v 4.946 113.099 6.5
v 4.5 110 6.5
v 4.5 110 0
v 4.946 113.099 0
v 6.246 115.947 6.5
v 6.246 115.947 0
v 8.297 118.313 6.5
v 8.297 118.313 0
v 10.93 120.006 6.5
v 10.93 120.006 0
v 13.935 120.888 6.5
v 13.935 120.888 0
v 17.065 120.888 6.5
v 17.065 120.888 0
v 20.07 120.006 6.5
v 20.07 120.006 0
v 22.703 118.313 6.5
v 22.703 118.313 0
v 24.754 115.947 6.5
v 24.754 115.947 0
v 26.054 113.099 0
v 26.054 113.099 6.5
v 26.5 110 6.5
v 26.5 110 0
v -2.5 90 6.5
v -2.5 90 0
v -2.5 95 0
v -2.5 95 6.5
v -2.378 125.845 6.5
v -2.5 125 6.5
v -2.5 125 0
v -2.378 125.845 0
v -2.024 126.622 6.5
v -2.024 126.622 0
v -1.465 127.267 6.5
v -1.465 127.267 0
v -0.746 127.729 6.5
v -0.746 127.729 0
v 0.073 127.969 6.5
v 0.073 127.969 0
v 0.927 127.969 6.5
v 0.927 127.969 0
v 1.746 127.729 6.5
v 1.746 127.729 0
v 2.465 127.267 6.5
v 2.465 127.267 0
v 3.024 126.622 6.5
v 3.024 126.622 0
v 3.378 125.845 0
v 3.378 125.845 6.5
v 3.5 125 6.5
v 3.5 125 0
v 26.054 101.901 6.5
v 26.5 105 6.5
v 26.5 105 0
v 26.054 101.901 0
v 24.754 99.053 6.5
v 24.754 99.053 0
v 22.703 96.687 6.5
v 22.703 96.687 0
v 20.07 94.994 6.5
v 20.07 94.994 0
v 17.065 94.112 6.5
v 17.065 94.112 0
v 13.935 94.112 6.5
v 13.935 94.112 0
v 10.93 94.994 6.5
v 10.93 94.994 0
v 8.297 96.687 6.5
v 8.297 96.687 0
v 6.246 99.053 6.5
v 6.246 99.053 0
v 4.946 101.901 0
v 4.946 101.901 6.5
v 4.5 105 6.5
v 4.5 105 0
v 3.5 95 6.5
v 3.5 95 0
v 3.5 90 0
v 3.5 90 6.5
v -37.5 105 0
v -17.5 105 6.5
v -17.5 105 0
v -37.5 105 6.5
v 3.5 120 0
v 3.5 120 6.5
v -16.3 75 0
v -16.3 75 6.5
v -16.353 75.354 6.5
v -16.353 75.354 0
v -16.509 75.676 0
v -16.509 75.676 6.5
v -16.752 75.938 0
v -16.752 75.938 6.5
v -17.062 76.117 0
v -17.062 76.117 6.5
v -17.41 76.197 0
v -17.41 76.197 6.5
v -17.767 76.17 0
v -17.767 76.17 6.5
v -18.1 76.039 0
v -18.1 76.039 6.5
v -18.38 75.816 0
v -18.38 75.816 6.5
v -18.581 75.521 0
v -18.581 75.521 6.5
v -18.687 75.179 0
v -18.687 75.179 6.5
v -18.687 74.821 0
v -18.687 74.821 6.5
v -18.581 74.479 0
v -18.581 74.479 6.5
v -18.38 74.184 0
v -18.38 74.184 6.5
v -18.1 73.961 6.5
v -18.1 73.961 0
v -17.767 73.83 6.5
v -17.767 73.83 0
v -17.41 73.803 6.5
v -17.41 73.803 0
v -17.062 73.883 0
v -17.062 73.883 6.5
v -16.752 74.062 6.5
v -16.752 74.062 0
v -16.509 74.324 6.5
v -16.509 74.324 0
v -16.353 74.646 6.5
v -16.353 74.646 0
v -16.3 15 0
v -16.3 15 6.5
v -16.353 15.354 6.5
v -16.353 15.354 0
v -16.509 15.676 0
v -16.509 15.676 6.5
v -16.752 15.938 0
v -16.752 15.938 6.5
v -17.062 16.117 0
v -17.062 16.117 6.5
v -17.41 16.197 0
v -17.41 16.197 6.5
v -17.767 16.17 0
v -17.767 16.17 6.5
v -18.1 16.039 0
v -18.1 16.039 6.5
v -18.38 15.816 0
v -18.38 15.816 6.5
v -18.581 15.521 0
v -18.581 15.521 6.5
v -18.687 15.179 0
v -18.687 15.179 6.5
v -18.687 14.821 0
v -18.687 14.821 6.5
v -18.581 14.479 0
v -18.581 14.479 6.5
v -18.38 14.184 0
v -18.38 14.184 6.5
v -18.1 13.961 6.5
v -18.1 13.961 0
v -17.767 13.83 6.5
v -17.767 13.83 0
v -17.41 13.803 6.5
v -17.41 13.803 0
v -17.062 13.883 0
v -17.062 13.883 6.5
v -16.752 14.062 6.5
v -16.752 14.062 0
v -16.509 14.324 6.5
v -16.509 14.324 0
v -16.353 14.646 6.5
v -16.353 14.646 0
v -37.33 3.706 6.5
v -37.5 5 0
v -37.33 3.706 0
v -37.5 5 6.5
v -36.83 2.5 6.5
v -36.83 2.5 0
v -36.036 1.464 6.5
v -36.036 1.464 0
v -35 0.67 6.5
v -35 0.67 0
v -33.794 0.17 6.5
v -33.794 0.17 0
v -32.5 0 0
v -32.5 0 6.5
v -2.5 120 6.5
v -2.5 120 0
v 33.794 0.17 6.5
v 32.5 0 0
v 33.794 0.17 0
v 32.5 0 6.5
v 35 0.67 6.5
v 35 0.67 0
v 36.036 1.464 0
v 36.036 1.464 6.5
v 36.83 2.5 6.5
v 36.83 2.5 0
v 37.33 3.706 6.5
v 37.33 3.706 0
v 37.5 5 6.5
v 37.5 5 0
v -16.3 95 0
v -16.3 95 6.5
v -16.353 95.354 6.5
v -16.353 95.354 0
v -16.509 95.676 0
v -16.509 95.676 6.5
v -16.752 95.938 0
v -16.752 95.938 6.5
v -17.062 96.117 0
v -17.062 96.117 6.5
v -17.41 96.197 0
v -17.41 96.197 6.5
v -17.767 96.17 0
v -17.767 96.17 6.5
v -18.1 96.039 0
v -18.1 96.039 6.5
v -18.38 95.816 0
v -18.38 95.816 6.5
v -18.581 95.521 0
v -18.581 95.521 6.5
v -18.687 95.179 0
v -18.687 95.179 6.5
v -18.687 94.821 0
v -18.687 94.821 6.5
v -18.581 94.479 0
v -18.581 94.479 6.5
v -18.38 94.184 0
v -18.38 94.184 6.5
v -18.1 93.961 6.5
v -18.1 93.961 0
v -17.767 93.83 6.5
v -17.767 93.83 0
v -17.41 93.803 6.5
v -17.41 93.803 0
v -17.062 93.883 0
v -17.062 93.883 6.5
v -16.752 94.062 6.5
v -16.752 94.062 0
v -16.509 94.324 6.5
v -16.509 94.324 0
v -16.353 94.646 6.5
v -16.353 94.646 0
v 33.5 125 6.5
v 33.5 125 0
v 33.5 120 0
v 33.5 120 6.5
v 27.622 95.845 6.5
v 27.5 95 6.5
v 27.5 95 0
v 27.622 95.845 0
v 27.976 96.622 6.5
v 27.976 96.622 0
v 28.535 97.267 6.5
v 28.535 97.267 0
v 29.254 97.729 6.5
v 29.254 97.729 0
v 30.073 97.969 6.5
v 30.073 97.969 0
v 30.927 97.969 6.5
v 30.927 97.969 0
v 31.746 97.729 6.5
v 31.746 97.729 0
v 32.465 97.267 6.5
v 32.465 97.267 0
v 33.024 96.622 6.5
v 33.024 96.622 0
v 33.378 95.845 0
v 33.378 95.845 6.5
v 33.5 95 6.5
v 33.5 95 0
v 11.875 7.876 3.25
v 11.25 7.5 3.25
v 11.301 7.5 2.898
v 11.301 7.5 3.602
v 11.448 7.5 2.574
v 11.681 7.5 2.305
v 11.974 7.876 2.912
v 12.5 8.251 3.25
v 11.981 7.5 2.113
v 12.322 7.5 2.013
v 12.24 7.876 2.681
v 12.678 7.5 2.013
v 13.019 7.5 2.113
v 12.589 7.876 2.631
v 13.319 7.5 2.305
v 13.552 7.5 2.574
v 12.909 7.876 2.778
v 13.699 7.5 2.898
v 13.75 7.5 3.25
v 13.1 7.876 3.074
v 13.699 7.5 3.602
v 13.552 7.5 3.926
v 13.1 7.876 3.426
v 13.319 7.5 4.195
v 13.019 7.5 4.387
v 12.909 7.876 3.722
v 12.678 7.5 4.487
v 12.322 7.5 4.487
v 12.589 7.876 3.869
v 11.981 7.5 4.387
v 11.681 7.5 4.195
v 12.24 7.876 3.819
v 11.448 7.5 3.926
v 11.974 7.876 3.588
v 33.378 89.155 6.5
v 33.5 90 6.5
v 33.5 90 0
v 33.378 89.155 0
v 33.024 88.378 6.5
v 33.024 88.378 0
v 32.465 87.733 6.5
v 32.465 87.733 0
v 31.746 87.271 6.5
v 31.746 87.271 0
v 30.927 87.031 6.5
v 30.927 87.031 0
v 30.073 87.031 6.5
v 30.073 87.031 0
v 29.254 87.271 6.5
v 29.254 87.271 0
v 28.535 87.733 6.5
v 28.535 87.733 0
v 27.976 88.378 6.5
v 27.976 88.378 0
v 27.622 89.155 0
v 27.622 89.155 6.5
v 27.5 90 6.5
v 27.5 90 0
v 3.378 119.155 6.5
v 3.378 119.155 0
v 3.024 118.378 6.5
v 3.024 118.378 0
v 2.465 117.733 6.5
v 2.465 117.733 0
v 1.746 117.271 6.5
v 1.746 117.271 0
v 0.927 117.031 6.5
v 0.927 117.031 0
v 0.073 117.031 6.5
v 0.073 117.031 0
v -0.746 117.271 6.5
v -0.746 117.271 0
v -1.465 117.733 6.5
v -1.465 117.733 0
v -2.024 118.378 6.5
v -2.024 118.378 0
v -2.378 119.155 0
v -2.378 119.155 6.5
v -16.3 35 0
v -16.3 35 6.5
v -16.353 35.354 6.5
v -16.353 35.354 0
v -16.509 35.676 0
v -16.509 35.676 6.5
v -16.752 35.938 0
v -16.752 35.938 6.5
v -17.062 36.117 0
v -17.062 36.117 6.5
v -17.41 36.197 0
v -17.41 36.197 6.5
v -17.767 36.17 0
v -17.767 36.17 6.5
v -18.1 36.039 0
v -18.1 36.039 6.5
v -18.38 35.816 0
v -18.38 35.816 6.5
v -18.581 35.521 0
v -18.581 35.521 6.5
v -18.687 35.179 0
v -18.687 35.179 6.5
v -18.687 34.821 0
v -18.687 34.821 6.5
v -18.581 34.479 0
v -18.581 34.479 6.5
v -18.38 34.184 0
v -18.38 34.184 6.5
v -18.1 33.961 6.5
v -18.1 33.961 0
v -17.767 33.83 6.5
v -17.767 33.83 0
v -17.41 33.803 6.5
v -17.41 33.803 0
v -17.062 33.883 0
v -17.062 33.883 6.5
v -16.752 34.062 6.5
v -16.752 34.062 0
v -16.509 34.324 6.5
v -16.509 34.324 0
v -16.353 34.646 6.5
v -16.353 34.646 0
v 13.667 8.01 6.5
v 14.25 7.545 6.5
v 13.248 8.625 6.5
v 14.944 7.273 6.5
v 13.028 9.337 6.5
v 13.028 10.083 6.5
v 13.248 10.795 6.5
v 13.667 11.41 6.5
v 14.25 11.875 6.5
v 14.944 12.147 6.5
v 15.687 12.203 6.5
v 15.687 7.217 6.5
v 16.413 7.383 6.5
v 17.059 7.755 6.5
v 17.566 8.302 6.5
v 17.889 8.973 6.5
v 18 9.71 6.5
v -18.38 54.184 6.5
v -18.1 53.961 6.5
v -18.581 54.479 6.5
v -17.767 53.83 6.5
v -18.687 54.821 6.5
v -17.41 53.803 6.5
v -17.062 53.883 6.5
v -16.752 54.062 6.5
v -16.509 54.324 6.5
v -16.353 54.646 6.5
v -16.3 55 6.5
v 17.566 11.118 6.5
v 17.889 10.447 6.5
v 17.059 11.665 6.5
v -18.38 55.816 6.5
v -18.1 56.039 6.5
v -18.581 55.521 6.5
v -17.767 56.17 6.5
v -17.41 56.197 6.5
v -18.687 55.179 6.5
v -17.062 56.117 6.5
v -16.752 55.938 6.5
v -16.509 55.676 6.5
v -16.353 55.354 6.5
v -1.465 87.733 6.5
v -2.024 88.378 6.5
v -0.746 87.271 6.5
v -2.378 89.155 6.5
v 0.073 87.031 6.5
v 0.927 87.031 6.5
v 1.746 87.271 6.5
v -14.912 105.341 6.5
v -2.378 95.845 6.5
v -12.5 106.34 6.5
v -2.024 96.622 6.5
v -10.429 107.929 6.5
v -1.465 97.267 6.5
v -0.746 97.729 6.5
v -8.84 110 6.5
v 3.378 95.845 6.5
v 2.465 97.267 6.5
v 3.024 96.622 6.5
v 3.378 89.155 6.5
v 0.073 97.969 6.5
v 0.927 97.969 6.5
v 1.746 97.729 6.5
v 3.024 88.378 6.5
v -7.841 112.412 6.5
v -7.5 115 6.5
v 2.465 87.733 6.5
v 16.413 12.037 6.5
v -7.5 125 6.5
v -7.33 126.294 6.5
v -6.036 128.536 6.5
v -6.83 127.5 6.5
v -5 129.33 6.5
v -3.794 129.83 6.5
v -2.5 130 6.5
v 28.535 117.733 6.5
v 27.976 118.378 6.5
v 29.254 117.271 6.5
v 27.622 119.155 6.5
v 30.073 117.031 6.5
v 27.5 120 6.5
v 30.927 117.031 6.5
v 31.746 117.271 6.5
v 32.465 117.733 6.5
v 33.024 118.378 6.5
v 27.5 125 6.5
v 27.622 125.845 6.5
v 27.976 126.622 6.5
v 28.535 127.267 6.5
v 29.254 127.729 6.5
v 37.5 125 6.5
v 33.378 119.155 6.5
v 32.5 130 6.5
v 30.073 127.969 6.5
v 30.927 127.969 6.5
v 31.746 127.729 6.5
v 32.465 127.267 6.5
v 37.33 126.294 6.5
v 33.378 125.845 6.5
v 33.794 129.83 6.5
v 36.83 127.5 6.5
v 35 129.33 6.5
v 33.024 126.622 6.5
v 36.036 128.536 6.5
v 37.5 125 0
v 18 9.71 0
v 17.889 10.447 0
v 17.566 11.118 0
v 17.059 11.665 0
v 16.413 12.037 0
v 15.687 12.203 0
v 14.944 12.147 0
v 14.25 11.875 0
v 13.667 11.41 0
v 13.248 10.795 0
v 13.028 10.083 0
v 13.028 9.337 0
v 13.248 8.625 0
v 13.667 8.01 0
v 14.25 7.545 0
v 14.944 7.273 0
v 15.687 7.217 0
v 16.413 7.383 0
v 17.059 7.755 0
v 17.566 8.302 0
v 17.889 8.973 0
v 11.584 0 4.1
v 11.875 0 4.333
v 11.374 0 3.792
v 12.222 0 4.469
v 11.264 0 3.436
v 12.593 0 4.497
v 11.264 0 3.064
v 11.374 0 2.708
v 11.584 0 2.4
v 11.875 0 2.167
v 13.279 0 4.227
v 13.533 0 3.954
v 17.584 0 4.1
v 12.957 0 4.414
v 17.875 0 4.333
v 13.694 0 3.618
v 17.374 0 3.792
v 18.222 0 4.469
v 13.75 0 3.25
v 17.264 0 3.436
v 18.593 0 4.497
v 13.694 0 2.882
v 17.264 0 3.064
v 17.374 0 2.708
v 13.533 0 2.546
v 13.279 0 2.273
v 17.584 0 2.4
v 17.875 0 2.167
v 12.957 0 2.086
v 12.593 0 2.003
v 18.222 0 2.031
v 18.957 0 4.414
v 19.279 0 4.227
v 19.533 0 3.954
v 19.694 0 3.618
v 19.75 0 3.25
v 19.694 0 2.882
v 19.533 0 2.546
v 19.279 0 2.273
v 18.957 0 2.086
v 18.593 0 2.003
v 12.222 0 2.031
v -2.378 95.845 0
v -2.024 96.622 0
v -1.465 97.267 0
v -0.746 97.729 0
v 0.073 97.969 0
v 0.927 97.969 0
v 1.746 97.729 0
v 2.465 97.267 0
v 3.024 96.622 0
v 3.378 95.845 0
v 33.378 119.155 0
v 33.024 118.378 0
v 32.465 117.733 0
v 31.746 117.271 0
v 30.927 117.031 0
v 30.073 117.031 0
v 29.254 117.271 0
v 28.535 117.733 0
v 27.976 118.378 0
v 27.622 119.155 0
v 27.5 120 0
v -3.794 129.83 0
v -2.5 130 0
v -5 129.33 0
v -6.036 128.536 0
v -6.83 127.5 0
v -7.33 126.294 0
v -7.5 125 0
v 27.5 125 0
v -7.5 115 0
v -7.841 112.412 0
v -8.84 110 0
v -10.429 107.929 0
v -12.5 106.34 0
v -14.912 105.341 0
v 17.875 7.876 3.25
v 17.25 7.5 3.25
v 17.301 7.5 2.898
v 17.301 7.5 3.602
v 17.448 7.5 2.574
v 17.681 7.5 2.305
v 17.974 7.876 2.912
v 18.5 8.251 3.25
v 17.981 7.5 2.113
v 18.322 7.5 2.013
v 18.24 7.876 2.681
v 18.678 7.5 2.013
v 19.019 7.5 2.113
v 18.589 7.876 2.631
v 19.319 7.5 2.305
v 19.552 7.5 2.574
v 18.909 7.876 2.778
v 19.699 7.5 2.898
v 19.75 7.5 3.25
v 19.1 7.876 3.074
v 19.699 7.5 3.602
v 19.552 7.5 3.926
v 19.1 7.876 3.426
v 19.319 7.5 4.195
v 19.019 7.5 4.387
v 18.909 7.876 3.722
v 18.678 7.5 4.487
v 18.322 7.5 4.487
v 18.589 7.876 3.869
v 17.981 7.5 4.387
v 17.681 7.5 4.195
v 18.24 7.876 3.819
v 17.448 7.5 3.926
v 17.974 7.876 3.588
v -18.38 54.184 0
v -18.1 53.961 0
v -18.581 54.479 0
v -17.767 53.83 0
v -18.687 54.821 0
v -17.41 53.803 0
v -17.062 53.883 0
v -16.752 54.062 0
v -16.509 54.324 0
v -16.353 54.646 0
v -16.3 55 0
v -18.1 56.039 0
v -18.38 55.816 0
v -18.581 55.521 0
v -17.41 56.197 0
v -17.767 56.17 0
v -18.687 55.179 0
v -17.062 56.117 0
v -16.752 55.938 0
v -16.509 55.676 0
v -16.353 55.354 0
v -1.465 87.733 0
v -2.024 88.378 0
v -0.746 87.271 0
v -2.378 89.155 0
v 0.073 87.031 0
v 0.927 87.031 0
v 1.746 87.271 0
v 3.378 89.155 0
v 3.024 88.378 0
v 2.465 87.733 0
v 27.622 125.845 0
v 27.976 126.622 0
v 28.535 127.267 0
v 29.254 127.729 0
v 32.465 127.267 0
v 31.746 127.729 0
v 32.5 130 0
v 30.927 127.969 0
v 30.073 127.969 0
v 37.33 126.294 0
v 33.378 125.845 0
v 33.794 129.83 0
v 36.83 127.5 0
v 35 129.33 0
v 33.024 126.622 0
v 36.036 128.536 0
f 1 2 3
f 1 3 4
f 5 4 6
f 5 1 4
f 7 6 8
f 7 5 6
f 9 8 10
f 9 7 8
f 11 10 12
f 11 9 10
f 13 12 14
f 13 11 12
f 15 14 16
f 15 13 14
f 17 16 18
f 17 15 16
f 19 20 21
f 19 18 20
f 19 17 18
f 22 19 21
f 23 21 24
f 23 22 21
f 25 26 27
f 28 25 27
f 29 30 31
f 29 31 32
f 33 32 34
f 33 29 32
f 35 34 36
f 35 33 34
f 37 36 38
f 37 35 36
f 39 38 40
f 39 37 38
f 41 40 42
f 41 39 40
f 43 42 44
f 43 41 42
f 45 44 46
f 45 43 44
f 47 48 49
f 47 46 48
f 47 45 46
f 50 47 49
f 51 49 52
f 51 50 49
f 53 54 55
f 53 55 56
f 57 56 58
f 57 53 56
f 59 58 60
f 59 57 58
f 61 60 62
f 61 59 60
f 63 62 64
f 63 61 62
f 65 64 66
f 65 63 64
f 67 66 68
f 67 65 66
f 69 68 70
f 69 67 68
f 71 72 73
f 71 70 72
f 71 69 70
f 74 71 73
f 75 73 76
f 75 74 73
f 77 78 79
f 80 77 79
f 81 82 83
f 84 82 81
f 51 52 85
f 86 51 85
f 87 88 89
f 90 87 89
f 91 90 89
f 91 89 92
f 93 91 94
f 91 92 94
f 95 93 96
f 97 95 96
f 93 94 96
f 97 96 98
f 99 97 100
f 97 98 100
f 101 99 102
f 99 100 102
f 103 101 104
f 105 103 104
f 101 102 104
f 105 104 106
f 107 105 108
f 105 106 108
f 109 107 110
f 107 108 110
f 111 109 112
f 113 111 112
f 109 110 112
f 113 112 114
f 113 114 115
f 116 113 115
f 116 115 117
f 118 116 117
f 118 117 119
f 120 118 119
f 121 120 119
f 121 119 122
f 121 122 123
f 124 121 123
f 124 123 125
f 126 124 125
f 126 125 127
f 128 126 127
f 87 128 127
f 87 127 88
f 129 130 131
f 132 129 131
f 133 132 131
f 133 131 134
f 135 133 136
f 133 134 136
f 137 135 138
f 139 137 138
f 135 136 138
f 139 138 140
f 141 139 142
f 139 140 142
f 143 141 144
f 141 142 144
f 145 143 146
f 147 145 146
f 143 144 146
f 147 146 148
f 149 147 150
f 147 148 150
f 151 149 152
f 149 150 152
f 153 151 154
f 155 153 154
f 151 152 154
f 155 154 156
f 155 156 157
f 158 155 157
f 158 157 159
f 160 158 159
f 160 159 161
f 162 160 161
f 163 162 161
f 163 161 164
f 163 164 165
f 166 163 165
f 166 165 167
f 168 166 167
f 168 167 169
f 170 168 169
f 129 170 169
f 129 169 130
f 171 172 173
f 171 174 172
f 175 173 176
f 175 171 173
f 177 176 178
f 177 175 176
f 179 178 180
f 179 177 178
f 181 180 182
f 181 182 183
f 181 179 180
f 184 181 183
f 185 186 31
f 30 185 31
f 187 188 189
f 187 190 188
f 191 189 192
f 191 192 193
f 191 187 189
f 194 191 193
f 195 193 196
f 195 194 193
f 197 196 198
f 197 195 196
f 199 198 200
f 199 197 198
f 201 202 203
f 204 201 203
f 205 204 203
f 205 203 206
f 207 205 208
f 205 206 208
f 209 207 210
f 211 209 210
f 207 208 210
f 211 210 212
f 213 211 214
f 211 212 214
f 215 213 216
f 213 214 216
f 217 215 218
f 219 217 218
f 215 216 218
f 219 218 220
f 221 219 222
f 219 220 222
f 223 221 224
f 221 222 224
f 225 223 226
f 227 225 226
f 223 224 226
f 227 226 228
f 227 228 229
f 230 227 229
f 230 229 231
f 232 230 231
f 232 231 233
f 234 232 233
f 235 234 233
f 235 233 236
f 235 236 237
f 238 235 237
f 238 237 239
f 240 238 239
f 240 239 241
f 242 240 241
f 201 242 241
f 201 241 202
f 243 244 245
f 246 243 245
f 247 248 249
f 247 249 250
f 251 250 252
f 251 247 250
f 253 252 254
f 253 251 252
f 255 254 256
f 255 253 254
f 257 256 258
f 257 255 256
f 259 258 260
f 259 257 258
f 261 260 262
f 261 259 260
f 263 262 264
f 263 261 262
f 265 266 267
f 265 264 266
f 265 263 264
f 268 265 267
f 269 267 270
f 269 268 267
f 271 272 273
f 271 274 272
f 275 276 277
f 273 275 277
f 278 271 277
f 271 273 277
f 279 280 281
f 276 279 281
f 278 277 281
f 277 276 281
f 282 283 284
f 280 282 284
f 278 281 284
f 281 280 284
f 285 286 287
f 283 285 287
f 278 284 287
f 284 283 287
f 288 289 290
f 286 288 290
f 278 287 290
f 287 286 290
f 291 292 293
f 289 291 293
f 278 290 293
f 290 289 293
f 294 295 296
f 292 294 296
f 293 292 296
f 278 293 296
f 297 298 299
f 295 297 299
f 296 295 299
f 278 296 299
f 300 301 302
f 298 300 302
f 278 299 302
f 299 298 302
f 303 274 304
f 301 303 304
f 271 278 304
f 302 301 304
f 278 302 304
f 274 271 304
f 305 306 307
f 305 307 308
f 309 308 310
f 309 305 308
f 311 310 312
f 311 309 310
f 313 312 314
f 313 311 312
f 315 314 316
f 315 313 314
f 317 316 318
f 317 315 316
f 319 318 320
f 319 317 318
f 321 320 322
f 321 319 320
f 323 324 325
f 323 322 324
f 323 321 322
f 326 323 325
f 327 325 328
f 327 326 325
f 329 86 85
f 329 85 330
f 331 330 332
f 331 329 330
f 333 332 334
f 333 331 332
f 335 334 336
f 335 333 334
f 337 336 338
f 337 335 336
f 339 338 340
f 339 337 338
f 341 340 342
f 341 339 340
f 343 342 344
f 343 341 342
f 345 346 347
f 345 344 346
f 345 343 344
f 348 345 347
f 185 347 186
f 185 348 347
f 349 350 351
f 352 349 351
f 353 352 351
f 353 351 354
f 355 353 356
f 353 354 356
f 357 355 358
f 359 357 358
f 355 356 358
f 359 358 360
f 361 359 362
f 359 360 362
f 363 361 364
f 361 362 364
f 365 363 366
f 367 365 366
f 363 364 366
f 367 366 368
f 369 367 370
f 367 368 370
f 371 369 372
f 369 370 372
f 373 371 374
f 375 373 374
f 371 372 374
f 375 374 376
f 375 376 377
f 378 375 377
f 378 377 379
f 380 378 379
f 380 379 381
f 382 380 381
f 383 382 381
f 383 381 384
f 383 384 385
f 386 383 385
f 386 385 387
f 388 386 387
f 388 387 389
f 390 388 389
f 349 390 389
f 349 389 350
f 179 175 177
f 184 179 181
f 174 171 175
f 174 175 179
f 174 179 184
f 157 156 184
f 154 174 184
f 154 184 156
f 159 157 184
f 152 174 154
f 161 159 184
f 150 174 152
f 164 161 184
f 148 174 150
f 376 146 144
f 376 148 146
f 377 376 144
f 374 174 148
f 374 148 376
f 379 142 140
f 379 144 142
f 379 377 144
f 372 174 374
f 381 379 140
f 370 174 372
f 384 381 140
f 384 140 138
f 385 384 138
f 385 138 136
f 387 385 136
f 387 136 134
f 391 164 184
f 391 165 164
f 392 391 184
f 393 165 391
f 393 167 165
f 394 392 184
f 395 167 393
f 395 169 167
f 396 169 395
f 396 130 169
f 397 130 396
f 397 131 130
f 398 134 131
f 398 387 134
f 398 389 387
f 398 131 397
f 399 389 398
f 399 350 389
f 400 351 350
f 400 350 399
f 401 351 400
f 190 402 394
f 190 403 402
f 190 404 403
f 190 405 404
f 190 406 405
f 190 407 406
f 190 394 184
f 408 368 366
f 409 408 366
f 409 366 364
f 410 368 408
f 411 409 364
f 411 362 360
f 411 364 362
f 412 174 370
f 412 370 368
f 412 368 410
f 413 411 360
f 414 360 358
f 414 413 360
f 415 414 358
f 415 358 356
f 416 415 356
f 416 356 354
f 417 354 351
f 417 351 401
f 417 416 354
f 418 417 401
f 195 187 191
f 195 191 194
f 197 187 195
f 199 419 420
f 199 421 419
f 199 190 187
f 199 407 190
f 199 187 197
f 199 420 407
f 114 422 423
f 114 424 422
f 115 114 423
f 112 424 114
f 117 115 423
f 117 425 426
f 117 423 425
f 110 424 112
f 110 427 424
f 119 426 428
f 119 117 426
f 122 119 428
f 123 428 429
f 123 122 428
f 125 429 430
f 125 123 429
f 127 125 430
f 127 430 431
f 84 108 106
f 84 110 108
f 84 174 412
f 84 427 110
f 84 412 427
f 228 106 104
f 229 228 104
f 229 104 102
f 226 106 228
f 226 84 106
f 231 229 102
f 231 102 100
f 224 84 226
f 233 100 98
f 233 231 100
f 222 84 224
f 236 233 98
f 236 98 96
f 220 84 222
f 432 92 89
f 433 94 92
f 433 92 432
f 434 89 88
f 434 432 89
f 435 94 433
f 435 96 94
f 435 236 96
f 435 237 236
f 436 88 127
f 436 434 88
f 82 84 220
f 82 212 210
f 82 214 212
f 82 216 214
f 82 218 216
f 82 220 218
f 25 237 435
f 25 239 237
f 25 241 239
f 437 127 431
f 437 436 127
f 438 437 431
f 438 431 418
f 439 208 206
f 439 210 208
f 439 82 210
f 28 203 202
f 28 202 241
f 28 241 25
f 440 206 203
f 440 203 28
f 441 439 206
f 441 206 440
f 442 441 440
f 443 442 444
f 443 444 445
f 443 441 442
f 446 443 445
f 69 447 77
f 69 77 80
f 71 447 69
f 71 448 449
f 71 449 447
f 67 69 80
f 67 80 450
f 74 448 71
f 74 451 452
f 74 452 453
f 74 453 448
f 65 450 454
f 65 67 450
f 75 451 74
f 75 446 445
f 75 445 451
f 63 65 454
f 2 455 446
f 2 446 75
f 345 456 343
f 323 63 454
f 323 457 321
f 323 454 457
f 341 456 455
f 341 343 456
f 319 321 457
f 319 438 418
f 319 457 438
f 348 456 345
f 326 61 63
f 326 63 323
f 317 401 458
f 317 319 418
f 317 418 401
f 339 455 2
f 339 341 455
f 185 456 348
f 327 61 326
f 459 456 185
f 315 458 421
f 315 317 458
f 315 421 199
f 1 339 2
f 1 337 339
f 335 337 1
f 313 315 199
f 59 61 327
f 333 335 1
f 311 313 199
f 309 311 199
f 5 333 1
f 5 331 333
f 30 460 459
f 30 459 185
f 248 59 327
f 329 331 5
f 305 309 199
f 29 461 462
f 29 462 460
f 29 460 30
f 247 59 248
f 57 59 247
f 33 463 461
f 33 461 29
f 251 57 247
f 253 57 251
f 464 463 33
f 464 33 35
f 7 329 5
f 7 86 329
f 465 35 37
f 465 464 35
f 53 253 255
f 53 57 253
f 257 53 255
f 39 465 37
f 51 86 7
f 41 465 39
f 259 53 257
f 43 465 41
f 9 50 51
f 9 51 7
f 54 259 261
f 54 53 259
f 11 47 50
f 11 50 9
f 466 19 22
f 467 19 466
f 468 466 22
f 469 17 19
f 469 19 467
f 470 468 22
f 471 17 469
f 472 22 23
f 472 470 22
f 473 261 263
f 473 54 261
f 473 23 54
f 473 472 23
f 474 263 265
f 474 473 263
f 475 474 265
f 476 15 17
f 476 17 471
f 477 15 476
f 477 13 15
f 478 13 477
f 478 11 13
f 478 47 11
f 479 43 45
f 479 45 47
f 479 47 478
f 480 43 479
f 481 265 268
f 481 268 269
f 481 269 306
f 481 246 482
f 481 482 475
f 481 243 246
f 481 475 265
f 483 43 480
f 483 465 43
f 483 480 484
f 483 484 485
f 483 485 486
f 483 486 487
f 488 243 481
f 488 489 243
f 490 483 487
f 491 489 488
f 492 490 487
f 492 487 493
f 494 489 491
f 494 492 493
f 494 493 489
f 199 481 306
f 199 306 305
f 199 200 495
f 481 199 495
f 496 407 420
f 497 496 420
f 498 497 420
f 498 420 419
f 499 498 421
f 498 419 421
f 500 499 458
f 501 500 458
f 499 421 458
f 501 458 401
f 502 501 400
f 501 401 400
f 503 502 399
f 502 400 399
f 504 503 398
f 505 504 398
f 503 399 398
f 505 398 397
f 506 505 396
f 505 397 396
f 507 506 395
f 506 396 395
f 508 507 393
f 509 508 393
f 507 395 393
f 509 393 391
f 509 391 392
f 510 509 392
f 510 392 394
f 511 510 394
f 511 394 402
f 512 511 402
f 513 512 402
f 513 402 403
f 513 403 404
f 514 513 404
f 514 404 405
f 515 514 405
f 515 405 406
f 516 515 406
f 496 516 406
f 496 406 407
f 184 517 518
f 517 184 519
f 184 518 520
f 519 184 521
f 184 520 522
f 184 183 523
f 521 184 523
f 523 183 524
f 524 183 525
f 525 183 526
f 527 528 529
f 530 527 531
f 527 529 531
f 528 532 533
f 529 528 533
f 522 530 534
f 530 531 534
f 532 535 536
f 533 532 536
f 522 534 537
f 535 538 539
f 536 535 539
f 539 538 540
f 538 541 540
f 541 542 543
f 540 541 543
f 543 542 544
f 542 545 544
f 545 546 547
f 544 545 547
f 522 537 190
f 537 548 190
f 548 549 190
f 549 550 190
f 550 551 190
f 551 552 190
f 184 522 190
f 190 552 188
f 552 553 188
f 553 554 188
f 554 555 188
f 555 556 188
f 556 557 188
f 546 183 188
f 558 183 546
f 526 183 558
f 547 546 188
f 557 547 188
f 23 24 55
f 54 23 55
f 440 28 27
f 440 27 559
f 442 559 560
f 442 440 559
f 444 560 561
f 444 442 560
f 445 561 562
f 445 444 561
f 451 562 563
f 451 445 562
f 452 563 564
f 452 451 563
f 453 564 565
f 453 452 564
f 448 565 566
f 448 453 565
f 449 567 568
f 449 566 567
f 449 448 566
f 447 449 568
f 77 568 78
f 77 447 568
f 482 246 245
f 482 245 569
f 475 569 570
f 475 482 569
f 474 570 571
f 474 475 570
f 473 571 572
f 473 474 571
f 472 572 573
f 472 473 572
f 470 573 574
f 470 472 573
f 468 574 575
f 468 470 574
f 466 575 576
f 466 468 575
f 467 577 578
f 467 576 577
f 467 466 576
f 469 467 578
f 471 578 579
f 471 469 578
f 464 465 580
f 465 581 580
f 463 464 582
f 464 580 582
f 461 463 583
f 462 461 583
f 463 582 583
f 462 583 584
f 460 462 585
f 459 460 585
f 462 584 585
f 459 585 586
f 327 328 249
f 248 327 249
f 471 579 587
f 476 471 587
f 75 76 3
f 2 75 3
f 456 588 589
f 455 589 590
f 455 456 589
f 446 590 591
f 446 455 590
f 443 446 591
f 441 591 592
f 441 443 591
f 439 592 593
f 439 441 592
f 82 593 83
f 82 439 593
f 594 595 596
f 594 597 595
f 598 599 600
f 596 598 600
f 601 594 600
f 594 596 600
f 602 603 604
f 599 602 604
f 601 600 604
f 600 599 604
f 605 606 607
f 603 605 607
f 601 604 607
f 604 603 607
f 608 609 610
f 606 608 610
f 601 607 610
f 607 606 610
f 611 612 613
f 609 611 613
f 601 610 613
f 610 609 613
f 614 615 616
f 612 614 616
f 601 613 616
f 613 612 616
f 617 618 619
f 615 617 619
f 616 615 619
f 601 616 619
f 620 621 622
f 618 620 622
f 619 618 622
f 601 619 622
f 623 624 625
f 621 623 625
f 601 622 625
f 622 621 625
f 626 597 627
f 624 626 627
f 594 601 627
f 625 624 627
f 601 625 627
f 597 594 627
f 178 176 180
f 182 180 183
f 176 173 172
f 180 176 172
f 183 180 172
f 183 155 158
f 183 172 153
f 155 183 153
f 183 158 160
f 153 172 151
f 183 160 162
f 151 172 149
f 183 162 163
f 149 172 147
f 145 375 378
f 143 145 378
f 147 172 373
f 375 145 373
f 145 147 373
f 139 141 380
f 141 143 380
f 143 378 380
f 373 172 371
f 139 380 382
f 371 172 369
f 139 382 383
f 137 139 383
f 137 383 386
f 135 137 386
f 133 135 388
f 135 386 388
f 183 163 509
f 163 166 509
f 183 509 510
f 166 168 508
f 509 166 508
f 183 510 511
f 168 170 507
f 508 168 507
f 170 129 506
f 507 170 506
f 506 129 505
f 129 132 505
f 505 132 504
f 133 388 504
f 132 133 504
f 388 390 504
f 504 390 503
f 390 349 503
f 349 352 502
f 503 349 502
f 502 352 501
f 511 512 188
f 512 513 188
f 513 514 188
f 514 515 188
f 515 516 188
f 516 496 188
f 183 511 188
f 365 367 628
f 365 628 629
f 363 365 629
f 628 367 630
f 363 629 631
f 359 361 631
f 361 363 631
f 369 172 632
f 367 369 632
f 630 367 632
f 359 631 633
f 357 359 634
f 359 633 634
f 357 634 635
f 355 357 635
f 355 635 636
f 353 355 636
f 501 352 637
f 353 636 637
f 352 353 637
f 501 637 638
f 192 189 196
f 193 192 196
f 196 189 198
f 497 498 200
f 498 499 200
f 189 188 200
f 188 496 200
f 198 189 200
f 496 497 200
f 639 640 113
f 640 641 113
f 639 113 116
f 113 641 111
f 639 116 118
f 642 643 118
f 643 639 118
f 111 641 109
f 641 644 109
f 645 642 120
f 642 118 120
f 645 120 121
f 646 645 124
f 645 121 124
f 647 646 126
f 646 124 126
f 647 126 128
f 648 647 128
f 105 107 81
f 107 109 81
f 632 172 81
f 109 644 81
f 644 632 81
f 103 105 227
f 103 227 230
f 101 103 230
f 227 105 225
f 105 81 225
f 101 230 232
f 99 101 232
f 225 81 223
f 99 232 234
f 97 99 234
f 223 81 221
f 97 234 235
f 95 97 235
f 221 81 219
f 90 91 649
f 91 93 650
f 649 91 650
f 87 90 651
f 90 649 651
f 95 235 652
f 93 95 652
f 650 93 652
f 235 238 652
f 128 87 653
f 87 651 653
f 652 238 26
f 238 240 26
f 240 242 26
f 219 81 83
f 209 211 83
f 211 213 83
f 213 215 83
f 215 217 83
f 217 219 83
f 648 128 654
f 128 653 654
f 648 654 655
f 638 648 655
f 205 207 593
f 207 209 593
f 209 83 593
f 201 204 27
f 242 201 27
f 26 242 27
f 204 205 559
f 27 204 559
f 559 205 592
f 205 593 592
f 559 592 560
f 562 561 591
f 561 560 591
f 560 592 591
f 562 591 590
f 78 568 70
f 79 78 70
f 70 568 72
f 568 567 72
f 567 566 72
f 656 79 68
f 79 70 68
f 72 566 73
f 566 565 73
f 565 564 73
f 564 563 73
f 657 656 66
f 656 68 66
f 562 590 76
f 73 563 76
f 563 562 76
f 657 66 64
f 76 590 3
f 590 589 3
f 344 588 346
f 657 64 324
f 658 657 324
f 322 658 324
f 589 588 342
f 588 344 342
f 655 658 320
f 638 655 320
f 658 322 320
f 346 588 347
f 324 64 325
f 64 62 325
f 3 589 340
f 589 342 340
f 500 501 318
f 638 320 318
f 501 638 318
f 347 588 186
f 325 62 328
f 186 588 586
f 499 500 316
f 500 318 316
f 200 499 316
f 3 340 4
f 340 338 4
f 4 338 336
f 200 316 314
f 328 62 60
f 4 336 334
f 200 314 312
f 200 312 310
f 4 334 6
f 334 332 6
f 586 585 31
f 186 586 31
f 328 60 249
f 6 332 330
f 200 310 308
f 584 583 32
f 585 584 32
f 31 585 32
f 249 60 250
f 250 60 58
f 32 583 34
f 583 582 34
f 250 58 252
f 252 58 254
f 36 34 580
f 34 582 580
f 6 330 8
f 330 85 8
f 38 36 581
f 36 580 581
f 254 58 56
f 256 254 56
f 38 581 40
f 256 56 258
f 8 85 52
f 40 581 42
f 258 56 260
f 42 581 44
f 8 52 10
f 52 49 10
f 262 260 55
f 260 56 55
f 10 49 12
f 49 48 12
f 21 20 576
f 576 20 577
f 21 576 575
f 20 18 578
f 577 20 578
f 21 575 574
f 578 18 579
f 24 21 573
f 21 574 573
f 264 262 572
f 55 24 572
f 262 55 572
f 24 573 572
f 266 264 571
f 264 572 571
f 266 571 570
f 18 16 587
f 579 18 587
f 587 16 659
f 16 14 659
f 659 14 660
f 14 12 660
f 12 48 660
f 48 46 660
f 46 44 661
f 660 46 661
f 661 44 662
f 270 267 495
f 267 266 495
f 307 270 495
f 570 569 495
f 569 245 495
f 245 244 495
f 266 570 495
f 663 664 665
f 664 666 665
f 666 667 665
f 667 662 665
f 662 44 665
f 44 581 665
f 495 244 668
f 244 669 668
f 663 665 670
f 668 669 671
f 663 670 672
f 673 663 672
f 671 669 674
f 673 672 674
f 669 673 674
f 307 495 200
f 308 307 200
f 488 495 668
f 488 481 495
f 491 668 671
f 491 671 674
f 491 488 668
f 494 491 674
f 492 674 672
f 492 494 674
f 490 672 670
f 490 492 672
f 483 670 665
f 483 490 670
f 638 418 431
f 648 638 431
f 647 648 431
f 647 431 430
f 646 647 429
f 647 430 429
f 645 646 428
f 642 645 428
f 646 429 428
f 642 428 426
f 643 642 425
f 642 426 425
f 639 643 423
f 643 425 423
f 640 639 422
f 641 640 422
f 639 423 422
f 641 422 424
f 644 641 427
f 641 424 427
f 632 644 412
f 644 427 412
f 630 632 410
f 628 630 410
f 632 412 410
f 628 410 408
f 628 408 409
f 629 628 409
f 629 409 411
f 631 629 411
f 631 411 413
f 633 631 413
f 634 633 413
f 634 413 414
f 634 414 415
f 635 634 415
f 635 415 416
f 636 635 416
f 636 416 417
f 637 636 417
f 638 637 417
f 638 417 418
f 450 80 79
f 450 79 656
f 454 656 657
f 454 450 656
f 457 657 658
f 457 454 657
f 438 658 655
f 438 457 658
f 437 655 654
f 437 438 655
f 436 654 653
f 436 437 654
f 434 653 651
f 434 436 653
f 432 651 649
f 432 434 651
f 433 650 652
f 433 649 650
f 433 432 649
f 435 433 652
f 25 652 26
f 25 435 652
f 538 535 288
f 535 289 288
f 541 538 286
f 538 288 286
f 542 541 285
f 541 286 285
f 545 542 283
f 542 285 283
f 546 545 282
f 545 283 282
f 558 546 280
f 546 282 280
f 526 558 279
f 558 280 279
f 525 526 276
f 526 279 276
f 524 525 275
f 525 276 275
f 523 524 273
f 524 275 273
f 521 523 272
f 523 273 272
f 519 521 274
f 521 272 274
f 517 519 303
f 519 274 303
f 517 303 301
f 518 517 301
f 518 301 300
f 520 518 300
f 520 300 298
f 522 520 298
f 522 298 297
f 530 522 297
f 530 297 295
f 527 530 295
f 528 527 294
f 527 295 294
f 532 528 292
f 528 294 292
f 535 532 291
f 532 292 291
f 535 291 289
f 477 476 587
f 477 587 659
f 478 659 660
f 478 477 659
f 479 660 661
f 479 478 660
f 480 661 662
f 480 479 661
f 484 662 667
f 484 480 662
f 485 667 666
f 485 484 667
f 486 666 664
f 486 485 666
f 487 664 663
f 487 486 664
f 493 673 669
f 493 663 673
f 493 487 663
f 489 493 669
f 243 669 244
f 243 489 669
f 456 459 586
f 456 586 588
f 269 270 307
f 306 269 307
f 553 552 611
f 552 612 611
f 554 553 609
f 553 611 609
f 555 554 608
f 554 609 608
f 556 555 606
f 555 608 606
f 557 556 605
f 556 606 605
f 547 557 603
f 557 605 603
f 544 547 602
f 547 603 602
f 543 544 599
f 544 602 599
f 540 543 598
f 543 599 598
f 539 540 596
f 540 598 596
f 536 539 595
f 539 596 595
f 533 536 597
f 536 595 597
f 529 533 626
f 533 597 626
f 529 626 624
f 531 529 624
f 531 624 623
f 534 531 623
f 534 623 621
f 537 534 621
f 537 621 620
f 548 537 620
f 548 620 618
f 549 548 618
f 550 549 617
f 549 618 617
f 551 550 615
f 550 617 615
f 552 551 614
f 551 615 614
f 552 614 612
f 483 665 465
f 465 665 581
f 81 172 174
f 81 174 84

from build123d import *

# Parameters (mm, degrees)
SKETCH1_W                         = 37.5
SKETCH1_H                         = 130
MOUNTING_PLATE_DEPTH              = 6.5
MOTOR_MOUNT_DEPTH                 = 10
LPATTERN1_COUNT                   = 2
LPATTERN1_PITCH                   = 30
LPATTERN1_COUNT_DIR2              = 2
LPATTERN1_PITCH_DIR2              = 30
MOTOR_HOLE_DEPTH                  = 7.5
LIMIT_SWITCH_PLACEMENT_DEPTH      = 1
LIMIT_SWITCH_PLACEMENT_DEPTH_BACK = 7.5
SKETCH8_R                         = 1.2
SLIDE_HOLES_DEPTH                 = 7.5
LPATTERN2_COUNT                   = 5
LPATTERN2_PITCH                   = 20
FILLET1_R                         = 5
SKETCH16_R                        = 2.5
CUT_EXTRUDE1_DEPTH                = 7.5
M3X0_5_TAPPED_HOLE1_D             = 2.5
M3X0_5_TAPPED_HOLE1_DEPTH         = 7.5
M3X0_5_TAPPED_HOLE1_TIP           = 0.751075774


with BuildPart() as part:
    # Sketch1 → Mounting Plate (new body)
    with BuildSketch(Plane.XY):
        with Locations((-18.75, 65)):
            Rectangle(SKETCH1_W, SKETCH1_H)
        with Locations((18.75, 65)):
            Rectangle(SKETCH1_W, SKETCH1_H)
    extrude(amount=MOUNTING_PLATE_DEPTH)

    # Sketch3 → Motor Mount (cut)
    with BuildSketch(Plane.XY.offset(6.5)):
        with BuildLine():
            Line((-2.5, 120), (-2.5, 125))
            ThreePointArc((-2.5, 125), (0.5, 128), (3.5, 125))
            Line((3.5, 125), (3.5, 120))
            ThreePointArc((3.5, 120), (0.5, 117), (-2.5, 120))
        make_face()
    motor_mount = extrude(amount=-MOTOR_MOUNT_DEPTH, mode=Mode.SUBTRACT)

    # LPattern1: Motor Mount 2 × 2
    with Locations(*[(i * LPATTERN1_PITCH, -j * LPATTERN1_PITCH_DIR2, 0) for i in range(LPATTERN1_COUNT) for j in range(LPATTERN1_COUNT_DIR2) if (i, j) != (0, 0)]):
        add(motor_mount, mode=Mode.SUBTRACT)

    # Sketch7 → Motor Hole (cut, through all)
    with BuildSketch(Plane.XY.offset(6.5)):
        with BuildLine():
            Line((4.5, 105), (4.5, 110))
            ThreePointArc((4.5, 110), (15.5, 121), (26.5, 110))
            Line((26.5, 110), (26.5, 105))
            ThreePointArc((26.5, 105), (15.5, 94), (4.5, 105))
        make_face()
    extrude(amount=-MOTOR_HOLE_DEPTH, mode=Mode.SUBTRACT)

    # Sketch2 → Limit Switch Placement (cut, two sides)
    with BuildSketch(Plane.XY.offset(6.5)) as limit_switch_placement_sk:
        with BuildLine():
            Line((-7.5, 415.136329844), (-7.5, 130))
            Line((-7.5, 130), (-7.5, 115))
            ThreePointArc((-7.5, 115), (-10.428932188, 107.928932188), (-17.5, 105))
            Line((-17.5, 105), (-37.5, 105))
            Line((-37.5, 105), (-322.636329844, 105))
            Line((-322.636329844, 105), (-722.642663203, 511.455212366))
            Line((-722.642663203, 511.455212366), (-407.50633336, 821.59154221))
            Line((-407.50633336, 821.59154221), (-7.5, 415.136329844))
        make_face()
    extrude(amount=LIMIT_SWITCH_PLACEMENT_DEPTH, mode=Mode.SUBTRACT)
    extrude(limit_switch_placement_sk.sketch, amount=-LIMIT_SWITCH_PLACEMENT_DEPTH_BACK, mode=Mode.SUBTRACT)

    # Sketch8 → Slide Holes (cut, through all)
    with BuildSketch(Plane.XY.offset(6.5)):
        with Locations((-17.5, 95)):
            Circle(SKETCH8_R)
    slide_holes = extrude(amount=-SLIDE_HOLES_DEPTH, mode=Mode.SUBTRACT)

    # LPattern2: Slide Holes ×5
    with Locations(*[(0, -i * LPATTERN2_PITCH, 0) for i in range(1, LPATTERN2_COUNT)]):
        add(slide_holes, mode=Mode.SUBTRACT)

    # Fillet1
    fillet1_edges = [part.edges().sort_by_distance(p)[0] for p in [
        (37.5, 130, 3.25),
        (37.5, 0, 3.25),
        (-37.5, 0, 3.25),
        (-7.5, 130, 3.25),
    ]]
    fillet(fillet1_edges, radius=FILLET1_R)

    # Sketch16 → Cut-Extrude1 (cut, through all)
    with BuildSketch(Plane.XY.offset(6.5)):
        with Locations((15.5, 9.71)):
            Circle(SKETCH16_R)
    extrude(amount=-CUT_EXTRUDE1_DEPTH, mode=Mode.SUBTRACT)

    # M3x0.5 Tapped Hole1
    with Locations(Plane(origin=(0, 0, 0), x_dir=(-1, 0, 0), z_dir=(0, -1, 0))):
        with Locations((-18.5, -3.25), (-12.5, -3.25)):
            Hole(M3X0_5_TAPPED_HOLE1_D / 2, depth=M3X0_5_TAPPED_HOLE1_DEPTH)
            with Locations((0, 0, -(M3X0_5_TAPPED_HOLE1_DEPTH + M3X0_5_TAPPED_HOLE1_TIP / 2))):  # 118° drill point
                Cone(0, M3X0_5_TAPPED_HOLE1_D / 2, M3X0_5_TAPPED_HOLE1_TIP, mode=Mode.SUBTRACT)


solid = part.part
